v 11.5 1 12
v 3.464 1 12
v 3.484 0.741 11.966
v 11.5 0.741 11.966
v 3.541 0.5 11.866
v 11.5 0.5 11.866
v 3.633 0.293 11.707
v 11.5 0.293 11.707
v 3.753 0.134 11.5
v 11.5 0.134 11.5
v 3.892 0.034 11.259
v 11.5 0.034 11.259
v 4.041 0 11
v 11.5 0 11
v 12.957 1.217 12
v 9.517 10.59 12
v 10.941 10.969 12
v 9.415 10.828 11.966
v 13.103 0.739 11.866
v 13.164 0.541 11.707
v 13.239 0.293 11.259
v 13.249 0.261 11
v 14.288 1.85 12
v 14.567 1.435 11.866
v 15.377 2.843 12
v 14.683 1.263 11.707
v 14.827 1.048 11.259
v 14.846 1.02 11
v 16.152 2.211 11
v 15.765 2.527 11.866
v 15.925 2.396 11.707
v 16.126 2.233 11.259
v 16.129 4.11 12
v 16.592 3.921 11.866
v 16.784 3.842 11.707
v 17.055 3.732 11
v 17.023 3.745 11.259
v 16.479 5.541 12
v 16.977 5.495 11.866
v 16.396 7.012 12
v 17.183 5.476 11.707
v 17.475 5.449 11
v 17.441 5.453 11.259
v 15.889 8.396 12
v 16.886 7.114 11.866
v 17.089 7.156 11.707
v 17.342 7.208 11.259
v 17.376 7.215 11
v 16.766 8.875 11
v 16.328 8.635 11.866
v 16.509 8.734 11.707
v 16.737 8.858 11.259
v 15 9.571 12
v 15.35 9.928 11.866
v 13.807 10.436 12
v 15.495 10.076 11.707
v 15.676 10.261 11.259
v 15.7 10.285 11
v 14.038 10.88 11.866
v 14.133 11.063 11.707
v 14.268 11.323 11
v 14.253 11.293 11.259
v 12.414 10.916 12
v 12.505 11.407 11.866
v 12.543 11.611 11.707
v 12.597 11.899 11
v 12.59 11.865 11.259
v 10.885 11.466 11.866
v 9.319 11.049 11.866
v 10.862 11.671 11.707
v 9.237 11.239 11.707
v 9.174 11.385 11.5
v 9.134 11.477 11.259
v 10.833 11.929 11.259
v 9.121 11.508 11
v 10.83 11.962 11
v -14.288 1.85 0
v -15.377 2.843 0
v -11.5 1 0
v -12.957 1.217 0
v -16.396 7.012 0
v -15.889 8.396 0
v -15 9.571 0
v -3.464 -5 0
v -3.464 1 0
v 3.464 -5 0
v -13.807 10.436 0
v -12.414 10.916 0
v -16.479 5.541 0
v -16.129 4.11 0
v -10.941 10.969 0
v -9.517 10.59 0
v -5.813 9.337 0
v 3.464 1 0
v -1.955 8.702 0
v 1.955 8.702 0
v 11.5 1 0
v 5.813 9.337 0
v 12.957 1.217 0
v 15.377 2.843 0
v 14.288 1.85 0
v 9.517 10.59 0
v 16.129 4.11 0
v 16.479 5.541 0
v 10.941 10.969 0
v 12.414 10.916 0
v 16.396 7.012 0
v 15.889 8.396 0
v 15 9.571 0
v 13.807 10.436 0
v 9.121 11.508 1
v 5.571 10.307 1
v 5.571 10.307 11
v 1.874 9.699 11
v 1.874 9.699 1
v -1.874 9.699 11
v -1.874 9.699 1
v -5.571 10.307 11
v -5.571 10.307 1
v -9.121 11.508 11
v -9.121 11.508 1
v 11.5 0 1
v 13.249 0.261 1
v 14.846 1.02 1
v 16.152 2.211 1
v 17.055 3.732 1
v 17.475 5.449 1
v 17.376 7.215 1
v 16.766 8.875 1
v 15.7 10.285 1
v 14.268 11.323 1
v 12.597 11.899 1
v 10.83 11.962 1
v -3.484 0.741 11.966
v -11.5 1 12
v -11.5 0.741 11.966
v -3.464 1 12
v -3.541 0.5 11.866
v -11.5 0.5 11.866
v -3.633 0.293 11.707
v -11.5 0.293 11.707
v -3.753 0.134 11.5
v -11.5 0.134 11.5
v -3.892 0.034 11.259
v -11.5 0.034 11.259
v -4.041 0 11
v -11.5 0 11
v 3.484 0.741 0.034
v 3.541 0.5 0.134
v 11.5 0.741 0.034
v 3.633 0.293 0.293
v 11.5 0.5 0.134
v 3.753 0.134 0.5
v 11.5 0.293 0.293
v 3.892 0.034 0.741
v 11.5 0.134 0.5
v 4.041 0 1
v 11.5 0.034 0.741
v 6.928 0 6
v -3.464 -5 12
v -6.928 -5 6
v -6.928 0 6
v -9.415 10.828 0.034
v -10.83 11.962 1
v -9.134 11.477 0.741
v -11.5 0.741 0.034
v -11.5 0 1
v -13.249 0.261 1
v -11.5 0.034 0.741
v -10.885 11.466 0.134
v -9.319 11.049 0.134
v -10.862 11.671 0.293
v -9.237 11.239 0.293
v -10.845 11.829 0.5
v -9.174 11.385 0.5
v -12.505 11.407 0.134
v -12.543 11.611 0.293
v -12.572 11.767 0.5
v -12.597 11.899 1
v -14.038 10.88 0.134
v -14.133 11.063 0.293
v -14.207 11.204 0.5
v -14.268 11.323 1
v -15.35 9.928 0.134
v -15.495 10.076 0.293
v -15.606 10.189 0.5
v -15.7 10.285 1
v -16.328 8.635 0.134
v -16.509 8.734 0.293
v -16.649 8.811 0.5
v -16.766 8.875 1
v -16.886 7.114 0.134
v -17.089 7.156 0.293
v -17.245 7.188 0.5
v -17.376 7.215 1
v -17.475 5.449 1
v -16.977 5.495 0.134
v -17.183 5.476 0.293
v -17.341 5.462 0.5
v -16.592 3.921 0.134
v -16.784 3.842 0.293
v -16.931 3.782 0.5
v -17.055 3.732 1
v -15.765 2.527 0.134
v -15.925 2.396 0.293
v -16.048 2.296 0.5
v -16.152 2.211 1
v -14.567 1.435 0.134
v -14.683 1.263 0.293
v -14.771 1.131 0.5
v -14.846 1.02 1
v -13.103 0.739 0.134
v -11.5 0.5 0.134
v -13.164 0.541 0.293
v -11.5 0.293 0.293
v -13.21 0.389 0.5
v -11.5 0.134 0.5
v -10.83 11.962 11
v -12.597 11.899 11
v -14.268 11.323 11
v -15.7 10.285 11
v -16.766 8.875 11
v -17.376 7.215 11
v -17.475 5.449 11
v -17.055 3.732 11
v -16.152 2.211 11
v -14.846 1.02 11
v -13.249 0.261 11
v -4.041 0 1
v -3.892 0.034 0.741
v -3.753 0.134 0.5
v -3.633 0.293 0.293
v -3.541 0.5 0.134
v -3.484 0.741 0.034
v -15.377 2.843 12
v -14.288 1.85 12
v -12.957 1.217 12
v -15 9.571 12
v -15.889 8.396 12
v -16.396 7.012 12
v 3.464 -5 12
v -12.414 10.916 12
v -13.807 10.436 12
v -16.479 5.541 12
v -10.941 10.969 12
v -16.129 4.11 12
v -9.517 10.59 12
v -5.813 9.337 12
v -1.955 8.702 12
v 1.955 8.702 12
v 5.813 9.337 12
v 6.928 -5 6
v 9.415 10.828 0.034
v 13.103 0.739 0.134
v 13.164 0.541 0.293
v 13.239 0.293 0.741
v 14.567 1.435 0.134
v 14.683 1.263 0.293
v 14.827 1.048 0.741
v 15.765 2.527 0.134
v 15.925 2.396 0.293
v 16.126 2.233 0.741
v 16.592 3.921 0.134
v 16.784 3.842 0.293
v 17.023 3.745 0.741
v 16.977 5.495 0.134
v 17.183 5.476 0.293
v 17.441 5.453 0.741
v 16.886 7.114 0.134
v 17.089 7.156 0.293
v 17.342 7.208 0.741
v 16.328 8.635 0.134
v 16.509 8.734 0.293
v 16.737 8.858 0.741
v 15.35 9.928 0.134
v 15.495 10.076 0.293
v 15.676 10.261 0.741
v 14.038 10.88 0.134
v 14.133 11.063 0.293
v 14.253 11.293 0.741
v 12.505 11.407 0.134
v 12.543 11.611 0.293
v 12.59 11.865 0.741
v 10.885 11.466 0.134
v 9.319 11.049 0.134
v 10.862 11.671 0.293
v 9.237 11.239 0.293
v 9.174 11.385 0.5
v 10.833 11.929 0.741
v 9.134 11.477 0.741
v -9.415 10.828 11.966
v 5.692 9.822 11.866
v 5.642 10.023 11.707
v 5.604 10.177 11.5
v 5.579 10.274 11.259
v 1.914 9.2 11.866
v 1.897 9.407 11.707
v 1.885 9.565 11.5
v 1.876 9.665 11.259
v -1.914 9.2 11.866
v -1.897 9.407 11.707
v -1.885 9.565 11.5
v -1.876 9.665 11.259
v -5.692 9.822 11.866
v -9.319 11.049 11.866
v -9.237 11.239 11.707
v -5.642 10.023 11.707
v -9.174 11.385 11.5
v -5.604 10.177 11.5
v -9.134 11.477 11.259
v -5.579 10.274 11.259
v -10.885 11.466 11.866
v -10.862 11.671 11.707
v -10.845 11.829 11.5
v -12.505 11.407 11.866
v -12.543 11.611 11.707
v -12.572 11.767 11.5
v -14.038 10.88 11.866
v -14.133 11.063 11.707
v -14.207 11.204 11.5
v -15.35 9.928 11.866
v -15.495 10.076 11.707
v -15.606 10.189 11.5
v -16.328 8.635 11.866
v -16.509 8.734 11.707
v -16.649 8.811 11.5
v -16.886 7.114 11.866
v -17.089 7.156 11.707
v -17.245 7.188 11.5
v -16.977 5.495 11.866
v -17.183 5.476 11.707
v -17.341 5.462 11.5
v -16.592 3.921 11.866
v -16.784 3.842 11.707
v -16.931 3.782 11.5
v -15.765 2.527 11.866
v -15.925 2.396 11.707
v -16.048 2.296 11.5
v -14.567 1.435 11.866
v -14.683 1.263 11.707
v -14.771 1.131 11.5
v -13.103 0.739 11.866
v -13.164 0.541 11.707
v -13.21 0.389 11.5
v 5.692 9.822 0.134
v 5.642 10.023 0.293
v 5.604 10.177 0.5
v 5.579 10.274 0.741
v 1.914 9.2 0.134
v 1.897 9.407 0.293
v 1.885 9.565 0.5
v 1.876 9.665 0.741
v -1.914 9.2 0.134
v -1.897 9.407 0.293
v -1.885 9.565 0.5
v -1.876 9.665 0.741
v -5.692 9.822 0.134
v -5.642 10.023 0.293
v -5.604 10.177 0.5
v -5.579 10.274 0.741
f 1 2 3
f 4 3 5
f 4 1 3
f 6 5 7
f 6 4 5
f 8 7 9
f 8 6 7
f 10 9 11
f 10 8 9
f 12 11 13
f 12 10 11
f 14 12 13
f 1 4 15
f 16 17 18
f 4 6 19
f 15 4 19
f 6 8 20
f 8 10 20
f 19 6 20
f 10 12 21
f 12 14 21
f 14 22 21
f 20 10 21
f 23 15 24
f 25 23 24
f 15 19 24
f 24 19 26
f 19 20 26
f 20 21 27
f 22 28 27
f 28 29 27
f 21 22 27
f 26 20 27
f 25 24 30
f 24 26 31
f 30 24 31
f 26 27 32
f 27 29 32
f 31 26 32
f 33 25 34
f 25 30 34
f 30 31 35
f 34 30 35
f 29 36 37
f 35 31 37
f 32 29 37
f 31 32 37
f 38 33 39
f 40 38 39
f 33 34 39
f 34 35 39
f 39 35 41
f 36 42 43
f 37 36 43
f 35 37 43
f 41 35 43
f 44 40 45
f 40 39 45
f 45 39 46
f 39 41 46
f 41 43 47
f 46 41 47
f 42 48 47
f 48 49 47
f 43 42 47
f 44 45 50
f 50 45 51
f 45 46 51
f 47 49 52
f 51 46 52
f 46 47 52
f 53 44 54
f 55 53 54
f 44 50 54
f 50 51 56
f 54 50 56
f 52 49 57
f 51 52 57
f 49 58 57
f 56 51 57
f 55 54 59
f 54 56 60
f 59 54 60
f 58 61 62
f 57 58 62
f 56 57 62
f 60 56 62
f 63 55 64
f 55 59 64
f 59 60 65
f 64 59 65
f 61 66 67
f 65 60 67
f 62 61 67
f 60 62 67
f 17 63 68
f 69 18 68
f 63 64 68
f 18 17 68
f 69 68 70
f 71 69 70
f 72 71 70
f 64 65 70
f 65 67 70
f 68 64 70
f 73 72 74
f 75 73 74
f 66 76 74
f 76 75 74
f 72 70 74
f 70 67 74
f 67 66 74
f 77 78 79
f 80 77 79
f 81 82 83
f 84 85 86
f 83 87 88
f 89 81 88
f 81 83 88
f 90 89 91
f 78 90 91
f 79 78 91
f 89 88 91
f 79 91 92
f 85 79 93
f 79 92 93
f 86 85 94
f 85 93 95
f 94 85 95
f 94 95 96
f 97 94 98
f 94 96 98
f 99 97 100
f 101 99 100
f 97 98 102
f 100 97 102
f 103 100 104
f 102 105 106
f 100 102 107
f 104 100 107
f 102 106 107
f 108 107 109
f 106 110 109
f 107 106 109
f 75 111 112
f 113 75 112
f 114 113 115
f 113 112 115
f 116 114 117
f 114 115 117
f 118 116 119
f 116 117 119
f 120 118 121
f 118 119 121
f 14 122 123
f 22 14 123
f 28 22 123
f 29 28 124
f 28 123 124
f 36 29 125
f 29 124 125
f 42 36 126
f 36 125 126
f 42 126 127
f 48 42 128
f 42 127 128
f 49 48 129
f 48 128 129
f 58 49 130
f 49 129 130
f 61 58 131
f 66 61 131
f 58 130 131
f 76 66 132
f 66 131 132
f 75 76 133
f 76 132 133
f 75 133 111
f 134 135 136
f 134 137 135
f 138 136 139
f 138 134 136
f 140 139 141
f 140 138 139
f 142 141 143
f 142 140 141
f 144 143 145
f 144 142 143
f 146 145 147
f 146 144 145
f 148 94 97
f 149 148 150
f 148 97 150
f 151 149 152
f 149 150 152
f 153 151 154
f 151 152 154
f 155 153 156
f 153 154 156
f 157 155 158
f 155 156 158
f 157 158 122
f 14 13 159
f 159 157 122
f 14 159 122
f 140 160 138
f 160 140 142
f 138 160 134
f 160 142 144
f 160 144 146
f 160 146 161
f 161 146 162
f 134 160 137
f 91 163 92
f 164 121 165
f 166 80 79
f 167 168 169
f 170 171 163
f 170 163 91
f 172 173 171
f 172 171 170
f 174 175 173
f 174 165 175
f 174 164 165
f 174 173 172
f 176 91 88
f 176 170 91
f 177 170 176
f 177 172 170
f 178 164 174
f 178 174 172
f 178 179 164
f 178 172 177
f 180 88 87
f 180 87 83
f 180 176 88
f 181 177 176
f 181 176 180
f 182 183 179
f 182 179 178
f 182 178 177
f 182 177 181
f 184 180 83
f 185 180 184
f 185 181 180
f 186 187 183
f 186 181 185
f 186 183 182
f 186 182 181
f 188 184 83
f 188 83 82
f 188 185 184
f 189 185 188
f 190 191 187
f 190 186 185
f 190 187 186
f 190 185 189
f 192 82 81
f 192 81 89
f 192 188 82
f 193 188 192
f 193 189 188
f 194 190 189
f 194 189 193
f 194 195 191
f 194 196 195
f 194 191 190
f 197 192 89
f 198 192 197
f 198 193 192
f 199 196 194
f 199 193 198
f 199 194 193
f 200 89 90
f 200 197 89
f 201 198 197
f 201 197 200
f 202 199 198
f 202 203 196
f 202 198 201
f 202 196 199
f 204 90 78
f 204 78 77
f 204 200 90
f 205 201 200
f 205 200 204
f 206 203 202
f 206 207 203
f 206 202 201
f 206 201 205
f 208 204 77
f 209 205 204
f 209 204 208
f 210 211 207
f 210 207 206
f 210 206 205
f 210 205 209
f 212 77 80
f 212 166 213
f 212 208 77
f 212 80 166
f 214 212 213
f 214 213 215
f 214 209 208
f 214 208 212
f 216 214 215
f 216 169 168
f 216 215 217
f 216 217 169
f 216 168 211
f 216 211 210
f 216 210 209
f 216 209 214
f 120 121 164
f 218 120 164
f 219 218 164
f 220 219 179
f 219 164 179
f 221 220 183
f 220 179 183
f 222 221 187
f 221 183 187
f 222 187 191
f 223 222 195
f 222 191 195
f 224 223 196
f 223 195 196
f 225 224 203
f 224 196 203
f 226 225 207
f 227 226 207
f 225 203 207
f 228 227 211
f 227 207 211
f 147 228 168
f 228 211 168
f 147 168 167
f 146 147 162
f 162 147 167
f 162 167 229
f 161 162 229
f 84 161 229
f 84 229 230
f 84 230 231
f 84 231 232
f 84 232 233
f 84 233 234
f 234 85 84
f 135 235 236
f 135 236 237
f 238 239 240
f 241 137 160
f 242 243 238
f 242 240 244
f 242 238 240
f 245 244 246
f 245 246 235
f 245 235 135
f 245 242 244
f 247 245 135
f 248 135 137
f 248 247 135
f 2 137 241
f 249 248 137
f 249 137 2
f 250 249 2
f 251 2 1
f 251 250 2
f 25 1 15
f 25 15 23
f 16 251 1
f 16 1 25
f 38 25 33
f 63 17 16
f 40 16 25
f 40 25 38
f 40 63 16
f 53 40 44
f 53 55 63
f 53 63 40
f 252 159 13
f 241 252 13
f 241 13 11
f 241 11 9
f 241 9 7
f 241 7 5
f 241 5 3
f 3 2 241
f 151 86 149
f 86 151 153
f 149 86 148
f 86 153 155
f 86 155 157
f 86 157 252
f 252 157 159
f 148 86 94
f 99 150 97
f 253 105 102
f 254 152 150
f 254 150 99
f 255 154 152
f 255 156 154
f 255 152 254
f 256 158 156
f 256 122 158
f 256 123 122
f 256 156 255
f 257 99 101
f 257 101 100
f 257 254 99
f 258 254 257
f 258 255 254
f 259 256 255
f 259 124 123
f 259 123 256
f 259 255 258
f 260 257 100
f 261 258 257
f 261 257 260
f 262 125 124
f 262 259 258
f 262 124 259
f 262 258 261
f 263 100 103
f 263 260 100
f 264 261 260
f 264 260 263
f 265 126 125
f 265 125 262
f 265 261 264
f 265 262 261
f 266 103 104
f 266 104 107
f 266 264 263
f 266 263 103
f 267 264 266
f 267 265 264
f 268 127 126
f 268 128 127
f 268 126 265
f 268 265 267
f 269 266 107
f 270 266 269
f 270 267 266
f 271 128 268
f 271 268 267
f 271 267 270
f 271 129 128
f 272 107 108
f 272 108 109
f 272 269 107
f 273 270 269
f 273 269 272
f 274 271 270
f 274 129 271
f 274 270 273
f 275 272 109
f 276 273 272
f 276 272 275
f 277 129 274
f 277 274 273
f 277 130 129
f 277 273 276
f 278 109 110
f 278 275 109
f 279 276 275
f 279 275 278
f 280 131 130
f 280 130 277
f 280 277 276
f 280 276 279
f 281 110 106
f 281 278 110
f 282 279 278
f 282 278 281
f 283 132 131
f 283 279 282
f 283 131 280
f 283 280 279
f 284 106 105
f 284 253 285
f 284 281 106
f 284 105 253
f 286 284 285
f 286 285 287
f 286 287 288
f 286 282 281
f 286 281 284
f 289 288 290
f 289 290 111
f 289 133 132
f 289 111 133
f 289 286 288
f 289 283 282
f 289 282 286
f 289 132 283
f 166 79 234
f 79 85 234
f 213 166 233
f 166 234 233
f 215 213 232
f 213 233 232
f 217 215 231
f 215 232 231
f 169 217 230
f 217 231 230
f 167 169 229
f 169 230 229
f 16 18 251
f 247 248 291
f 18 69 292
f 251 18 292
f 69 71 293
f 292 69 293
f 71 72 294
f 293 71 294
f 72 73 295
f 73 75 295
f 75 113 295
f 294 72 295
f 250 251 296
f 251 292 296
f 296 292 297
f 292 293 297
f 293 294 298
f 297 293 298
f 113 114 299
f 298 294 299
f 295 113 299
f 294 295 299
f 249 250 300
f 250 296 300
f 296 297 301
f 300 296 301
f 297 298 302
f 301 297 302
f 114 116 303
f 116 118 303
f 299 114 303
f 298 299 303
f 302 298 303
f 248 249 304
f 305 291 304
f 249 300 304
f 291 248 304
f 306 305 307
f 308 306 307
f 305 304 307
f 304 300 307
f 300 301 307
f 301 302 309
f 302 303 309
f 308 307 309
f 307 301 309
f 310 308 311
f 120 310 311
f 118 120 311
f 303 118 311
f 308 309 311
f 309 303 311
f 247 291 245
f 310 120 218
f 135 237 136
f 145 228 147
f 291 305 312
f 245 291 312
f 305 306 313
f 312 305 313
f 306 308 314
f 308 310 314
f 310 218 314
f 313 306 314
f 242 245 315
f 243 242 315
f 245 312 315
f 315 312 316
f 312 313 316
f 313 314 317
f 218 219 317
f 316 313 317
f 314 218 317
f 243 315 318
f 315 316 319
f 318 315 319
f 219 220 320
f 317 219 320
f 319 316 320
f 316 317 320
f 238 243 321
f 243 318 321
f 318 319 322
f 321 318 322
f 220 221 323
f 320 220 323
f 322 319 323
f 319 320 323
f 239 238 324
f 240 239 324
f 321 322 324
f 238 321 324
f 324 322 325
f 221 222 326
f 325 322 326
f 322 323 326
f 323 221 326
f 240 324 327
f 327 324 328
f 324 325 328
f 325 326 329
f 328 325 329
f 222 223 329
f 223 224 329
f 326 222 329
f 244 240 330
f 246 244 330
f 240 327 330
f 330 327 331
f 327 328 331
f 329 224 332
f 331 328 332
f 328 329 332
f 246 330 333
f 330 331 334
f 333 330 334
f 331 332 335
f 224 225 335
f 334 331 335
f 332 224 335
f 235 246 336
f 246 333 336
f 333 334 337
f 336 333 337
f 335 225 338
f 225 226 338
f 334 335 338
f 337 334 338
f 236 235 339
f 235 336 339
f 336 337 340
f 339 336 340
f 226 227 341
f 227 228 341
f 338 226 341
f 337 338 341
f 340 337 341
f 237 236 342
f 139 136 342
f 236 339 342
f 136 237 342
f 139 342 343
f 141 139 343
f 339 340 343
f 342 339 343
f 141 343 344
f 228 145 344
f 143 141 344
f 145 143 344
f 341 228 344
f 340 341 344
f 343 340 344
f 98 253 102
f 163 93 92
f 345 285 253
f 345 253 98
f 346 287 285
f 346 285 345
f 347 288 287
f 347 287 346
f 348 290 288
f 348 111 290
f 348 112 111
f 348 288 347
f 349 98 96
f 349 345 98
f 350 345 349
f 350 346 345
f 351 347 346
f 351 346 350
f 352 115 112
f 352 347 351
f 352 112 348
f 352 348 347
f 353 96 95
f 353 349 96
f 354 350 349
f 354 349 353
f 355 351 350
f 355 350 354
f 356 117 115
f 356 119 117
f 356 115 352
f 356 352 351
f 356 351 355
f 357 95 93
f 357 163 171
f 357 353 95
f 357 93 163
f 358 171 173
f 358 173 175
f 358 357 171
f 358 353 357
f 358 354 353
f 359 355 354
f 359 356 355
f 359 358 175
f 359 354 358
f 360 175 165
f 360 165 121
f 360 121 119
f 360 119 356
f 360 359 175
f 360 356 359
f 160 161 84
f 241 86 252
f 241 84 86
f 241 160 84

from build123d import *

# Parameters (mm, degrees)
F1_DEPTH = 5
F3_DEPTH = 12
F4_R     = 1


# Not quite as in the source:
# - a feature names something its author has since deleted; it is built from what else it names


with BuildPart() as f1:
    # F0 (on Front) → F1 (new body)
    with BuildSketch(Plane.XZ):
        Polygon((3.4641016151, 0), (6.9282032303, 6), (3.4641016151, 12), (-3.4641016151, 12), (-6.9282032303, 6), (-3.4641016151, 0), align=None)
    extrude(amount=F1_DEPTH)

    # F2 (on Top) → F3 (join)
    with BuildSketch(Plane.XY):
        with BuildLine():
            ThreePointArc((-9.1206896552, 11.5080742808), (-17.3757316857, 7.2148156887), (-11.5, 0))
            Line((-11.5, 0), (11.5, 0))
            ThreePointArc((11.5, 0), (17.3757316857, 7.2148156887), (9.1206896552, 11.5080742808))
            ThreePointArc((9.1206896552, 11.5080742808), (0, 9.6223590239), (-9.1206896552, 11.5080742808))
        make_face()
    extrude(amount=F3_DEPTH)

    # F4
    f4_edges = [f1.edges().sort_by_distance(p)[0] for p in [
        (7.482051, 0, 12),
        (7.482051, 0, 0),
    ]]
    fillet(f4_edges, radius=F4_R)


solid = f1.part
